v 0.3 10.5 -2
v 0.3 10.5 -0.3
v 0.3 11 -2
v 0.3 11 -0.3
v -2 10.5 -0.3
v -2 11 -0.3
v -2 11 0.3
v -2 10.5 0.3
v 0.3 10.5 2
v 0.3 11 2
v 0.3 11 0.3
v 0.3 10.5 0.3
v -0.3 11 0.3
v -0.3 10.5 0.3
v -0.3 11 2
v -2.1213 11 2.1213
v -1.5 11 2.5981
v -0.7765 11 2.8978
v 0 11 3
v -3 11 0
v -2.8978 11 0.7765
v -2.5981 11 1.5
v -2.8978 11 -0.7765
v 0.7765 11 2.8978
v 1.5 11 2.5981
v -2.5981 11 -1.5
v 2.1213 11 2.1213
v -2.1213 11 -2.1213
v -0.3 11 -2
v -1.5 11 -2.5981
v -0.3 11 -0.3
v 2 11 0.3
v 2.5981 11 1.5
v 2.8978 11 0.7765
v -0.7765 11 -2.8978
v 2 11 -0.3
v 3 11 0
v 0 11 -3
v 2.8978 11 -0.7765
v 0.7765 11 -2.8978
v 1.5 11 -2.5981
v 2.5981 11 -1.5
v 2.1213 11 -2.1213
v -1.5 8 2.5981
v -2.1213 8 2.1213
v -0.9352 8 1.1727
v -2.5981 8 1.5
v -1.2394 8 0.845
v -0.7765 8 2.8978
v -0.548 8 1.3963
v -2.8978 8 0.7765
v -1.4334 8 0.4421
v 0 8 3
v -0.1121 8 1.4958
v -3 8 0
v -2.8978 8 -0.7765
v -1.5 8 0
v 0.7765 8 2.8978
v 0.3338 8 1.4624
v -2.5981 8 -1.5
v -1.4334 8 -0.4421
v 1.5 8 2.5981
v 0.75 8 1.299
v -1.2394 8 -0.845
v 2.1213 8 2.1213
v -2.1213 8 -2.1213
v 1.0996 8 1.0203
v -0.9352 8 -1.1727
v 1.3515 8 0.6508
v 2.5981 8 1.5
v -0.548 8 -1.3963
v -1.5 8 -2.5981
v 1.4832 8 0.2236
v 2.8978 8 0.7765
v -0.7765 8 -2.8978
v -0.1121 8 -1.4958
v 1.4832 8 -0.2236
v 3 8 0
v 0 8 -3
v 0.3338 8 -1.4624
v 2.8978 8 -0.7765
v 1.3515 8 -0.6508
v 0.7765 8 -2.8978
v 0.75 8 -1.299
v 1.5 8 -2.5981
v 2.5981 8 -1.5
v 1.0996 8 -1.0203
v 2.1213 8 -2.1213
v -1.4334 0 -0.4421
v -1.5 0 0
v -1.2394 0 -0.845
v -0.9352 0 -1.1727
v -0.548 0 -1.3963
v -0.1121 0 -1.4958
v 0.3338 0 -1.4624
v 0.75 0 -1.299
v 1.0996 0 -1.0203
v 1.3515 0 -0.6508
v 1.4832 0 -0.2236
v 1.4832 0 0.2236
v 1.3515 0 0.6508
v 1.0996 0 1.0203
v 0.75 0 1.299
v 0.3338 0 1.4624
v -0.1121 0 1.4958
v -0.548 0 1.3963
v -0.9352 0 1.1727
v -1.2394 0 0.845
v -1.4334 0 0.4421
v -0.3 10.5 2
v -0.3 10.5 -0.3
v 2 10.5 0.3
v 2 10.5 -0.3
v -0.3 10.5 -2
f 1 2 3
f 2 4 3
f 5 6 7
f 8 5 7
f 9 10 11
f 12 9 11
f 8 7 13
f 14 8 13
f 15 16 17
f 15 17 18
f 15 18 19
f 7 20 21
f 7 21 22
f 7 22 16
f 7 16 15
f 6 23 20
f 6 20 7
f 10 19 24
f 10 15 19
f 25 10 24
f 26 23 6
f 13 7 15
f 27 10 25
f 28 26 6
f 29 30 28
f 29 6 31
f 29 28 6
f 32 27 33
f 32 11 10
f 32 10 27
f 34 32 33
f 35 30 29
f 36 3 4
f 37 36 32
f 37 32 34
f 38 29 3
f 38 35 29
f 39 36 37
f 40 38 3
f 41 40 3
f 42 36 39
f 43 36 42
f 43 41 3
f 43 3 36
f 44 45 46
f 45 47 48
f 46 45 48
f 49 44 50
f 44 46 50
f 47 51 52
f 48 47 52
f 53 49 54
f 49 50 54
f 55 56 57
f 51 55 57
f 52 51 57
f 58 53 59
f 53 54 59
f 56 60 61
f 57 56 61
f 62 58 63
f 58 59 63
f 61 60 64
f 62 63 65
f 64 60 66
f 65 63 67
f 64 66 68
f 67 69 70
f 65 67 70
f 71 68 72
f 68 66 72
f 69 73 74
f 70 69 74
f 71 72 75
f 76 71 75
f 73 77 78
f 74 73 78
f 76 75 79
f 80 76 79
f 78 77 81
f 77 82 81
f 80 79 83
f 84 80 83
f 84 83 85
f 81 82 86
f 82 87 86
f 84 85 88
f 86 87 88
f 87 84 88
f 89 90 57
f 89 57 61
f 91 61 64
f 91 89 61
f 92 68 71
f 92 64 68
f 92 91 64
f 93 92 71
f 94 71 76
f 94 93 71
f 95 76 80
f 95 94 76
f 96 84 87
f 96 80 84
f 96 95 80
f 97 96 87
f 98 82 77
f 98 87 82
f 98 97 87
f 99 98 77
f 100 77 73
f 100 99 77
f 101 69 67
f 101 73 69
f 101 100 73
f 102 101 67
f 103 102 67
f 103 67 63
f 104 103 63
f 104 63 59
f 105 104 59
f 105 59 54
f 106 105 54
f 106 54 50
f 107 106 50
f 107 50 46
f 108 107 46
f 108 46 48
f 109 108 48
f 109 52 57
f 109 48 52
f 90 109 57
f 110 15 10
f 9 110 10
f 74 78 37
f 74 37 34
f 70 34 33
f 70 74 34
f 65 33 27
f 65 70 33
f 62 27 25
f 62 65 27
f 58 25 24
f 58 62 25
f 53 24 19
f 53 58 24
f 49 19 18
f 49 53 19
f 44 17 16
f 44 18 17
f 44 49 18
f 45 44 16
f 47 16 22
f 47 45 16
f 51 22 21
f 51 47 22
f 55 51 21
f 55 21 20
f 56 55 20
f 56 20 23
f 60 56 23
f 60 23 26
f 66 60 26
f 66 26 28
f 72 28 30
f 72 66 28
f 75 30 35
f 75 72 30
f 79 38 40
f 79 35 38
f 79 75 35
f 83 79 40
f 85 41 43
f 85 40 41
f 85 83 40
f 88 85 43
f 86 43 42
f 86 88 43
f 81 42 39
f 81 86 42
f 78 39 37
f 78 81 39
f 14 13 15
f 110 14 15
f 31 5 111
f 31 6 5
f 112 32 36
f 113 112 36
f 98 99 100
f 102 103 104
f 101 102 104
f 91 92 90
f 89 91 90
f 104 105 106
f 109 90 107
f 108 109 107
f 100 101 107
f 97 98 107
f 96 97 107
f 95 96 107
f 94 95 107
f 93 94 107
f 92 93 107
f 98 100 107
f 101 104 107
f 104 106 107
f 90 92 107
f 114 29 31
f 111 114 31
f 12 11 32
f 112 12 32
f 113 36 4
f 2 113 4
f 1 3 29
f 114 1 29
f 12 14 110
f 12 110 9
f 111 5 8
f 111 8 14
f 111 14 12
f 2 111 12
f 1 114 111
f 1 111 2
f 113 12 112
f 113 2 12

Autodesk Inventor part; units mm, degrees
ref_plane "YZ Plane" through (0, 0, 0) normal (1, 0, 0) x (0, 1, 0)
ref_plane "XZ Plane" through (0, 0, 0) normal (0, 1, 0) x (-1, 0, 0)
ref_plane "XY Plane" through (0, 0, 0) normal (0, 0, 1) x (1, 0, 0)
sketch "Sketch1" plane through (0, 0, 0) normal (0, 1, 0) x (-1, 0, 0)
  circle A0 centre (0, 0) radius 1.5
  dimension "d0" = 3
extrude "Extrusion1" add sketch "Sketch1" along normal blind 8
sketch "Sketch2" plane through (0, 8, 0) normal (0, 1, 0) x (1, 0, 0)
  circle A0 centre (0, 0) radius 3
  dimension "d3" = 6
extrude "Extrusion2" add sketch "Sketch2" along normal blind 3
sketch "Sketch3" plane through (0, 11, 0) normal (0, 1, 0) x (1, 0, 0)
  line L0 (-2, -0.3) -> (-0.3, -0.3)
  line L1 (-0.3, -0.3) -> (-0.3, -2)
  line L2 (-0.3, -2) -> (0.3, -2)
  line L3 (0.3, -2) -> (0.3, -0.3)
  line L4 (0.3, -0.3) -> (2, -0.3)
  line L5 (2, -0.3) -> (2, 0.3)
  line L6 (2, 0.3) -> (0.3, 0.3)
  line L7 (0.3, 0.3) -> (0.3, 2)
  line L8 (0.3, 2) -> (-0.3, 2)
  line L9 (-0.3, 2) -> (-0.3, 0.3)
  line L10 (-2, 0.3) -> (-2, -0.3)
  line L11 (-2, 0.3) -> (-0.3, 0.3)
  circle A0 centre (0, 0) radius 3 projected
  point P0 (0, 0)
  dimension "d19" = 0.3
  dimension "d20" = 0.3
  dimension "d22" = 2
  dimension "d23" = 0
  dimension "d26" = 0.3
  dimension "d27" = 0.3
extrude "Extrusion3" cut sketch "Sketch3" against normal blind 0.5 contours L10 L11 L9 L8 L7 L6 L5 L4 L3 L2 L1 L0
thread "Thread1" size "M3x0.5" class "6g" standard "ANSI Metric M Profile" full length
properties part number "BoltM3-PI" material "PC/ABS Plastic"
